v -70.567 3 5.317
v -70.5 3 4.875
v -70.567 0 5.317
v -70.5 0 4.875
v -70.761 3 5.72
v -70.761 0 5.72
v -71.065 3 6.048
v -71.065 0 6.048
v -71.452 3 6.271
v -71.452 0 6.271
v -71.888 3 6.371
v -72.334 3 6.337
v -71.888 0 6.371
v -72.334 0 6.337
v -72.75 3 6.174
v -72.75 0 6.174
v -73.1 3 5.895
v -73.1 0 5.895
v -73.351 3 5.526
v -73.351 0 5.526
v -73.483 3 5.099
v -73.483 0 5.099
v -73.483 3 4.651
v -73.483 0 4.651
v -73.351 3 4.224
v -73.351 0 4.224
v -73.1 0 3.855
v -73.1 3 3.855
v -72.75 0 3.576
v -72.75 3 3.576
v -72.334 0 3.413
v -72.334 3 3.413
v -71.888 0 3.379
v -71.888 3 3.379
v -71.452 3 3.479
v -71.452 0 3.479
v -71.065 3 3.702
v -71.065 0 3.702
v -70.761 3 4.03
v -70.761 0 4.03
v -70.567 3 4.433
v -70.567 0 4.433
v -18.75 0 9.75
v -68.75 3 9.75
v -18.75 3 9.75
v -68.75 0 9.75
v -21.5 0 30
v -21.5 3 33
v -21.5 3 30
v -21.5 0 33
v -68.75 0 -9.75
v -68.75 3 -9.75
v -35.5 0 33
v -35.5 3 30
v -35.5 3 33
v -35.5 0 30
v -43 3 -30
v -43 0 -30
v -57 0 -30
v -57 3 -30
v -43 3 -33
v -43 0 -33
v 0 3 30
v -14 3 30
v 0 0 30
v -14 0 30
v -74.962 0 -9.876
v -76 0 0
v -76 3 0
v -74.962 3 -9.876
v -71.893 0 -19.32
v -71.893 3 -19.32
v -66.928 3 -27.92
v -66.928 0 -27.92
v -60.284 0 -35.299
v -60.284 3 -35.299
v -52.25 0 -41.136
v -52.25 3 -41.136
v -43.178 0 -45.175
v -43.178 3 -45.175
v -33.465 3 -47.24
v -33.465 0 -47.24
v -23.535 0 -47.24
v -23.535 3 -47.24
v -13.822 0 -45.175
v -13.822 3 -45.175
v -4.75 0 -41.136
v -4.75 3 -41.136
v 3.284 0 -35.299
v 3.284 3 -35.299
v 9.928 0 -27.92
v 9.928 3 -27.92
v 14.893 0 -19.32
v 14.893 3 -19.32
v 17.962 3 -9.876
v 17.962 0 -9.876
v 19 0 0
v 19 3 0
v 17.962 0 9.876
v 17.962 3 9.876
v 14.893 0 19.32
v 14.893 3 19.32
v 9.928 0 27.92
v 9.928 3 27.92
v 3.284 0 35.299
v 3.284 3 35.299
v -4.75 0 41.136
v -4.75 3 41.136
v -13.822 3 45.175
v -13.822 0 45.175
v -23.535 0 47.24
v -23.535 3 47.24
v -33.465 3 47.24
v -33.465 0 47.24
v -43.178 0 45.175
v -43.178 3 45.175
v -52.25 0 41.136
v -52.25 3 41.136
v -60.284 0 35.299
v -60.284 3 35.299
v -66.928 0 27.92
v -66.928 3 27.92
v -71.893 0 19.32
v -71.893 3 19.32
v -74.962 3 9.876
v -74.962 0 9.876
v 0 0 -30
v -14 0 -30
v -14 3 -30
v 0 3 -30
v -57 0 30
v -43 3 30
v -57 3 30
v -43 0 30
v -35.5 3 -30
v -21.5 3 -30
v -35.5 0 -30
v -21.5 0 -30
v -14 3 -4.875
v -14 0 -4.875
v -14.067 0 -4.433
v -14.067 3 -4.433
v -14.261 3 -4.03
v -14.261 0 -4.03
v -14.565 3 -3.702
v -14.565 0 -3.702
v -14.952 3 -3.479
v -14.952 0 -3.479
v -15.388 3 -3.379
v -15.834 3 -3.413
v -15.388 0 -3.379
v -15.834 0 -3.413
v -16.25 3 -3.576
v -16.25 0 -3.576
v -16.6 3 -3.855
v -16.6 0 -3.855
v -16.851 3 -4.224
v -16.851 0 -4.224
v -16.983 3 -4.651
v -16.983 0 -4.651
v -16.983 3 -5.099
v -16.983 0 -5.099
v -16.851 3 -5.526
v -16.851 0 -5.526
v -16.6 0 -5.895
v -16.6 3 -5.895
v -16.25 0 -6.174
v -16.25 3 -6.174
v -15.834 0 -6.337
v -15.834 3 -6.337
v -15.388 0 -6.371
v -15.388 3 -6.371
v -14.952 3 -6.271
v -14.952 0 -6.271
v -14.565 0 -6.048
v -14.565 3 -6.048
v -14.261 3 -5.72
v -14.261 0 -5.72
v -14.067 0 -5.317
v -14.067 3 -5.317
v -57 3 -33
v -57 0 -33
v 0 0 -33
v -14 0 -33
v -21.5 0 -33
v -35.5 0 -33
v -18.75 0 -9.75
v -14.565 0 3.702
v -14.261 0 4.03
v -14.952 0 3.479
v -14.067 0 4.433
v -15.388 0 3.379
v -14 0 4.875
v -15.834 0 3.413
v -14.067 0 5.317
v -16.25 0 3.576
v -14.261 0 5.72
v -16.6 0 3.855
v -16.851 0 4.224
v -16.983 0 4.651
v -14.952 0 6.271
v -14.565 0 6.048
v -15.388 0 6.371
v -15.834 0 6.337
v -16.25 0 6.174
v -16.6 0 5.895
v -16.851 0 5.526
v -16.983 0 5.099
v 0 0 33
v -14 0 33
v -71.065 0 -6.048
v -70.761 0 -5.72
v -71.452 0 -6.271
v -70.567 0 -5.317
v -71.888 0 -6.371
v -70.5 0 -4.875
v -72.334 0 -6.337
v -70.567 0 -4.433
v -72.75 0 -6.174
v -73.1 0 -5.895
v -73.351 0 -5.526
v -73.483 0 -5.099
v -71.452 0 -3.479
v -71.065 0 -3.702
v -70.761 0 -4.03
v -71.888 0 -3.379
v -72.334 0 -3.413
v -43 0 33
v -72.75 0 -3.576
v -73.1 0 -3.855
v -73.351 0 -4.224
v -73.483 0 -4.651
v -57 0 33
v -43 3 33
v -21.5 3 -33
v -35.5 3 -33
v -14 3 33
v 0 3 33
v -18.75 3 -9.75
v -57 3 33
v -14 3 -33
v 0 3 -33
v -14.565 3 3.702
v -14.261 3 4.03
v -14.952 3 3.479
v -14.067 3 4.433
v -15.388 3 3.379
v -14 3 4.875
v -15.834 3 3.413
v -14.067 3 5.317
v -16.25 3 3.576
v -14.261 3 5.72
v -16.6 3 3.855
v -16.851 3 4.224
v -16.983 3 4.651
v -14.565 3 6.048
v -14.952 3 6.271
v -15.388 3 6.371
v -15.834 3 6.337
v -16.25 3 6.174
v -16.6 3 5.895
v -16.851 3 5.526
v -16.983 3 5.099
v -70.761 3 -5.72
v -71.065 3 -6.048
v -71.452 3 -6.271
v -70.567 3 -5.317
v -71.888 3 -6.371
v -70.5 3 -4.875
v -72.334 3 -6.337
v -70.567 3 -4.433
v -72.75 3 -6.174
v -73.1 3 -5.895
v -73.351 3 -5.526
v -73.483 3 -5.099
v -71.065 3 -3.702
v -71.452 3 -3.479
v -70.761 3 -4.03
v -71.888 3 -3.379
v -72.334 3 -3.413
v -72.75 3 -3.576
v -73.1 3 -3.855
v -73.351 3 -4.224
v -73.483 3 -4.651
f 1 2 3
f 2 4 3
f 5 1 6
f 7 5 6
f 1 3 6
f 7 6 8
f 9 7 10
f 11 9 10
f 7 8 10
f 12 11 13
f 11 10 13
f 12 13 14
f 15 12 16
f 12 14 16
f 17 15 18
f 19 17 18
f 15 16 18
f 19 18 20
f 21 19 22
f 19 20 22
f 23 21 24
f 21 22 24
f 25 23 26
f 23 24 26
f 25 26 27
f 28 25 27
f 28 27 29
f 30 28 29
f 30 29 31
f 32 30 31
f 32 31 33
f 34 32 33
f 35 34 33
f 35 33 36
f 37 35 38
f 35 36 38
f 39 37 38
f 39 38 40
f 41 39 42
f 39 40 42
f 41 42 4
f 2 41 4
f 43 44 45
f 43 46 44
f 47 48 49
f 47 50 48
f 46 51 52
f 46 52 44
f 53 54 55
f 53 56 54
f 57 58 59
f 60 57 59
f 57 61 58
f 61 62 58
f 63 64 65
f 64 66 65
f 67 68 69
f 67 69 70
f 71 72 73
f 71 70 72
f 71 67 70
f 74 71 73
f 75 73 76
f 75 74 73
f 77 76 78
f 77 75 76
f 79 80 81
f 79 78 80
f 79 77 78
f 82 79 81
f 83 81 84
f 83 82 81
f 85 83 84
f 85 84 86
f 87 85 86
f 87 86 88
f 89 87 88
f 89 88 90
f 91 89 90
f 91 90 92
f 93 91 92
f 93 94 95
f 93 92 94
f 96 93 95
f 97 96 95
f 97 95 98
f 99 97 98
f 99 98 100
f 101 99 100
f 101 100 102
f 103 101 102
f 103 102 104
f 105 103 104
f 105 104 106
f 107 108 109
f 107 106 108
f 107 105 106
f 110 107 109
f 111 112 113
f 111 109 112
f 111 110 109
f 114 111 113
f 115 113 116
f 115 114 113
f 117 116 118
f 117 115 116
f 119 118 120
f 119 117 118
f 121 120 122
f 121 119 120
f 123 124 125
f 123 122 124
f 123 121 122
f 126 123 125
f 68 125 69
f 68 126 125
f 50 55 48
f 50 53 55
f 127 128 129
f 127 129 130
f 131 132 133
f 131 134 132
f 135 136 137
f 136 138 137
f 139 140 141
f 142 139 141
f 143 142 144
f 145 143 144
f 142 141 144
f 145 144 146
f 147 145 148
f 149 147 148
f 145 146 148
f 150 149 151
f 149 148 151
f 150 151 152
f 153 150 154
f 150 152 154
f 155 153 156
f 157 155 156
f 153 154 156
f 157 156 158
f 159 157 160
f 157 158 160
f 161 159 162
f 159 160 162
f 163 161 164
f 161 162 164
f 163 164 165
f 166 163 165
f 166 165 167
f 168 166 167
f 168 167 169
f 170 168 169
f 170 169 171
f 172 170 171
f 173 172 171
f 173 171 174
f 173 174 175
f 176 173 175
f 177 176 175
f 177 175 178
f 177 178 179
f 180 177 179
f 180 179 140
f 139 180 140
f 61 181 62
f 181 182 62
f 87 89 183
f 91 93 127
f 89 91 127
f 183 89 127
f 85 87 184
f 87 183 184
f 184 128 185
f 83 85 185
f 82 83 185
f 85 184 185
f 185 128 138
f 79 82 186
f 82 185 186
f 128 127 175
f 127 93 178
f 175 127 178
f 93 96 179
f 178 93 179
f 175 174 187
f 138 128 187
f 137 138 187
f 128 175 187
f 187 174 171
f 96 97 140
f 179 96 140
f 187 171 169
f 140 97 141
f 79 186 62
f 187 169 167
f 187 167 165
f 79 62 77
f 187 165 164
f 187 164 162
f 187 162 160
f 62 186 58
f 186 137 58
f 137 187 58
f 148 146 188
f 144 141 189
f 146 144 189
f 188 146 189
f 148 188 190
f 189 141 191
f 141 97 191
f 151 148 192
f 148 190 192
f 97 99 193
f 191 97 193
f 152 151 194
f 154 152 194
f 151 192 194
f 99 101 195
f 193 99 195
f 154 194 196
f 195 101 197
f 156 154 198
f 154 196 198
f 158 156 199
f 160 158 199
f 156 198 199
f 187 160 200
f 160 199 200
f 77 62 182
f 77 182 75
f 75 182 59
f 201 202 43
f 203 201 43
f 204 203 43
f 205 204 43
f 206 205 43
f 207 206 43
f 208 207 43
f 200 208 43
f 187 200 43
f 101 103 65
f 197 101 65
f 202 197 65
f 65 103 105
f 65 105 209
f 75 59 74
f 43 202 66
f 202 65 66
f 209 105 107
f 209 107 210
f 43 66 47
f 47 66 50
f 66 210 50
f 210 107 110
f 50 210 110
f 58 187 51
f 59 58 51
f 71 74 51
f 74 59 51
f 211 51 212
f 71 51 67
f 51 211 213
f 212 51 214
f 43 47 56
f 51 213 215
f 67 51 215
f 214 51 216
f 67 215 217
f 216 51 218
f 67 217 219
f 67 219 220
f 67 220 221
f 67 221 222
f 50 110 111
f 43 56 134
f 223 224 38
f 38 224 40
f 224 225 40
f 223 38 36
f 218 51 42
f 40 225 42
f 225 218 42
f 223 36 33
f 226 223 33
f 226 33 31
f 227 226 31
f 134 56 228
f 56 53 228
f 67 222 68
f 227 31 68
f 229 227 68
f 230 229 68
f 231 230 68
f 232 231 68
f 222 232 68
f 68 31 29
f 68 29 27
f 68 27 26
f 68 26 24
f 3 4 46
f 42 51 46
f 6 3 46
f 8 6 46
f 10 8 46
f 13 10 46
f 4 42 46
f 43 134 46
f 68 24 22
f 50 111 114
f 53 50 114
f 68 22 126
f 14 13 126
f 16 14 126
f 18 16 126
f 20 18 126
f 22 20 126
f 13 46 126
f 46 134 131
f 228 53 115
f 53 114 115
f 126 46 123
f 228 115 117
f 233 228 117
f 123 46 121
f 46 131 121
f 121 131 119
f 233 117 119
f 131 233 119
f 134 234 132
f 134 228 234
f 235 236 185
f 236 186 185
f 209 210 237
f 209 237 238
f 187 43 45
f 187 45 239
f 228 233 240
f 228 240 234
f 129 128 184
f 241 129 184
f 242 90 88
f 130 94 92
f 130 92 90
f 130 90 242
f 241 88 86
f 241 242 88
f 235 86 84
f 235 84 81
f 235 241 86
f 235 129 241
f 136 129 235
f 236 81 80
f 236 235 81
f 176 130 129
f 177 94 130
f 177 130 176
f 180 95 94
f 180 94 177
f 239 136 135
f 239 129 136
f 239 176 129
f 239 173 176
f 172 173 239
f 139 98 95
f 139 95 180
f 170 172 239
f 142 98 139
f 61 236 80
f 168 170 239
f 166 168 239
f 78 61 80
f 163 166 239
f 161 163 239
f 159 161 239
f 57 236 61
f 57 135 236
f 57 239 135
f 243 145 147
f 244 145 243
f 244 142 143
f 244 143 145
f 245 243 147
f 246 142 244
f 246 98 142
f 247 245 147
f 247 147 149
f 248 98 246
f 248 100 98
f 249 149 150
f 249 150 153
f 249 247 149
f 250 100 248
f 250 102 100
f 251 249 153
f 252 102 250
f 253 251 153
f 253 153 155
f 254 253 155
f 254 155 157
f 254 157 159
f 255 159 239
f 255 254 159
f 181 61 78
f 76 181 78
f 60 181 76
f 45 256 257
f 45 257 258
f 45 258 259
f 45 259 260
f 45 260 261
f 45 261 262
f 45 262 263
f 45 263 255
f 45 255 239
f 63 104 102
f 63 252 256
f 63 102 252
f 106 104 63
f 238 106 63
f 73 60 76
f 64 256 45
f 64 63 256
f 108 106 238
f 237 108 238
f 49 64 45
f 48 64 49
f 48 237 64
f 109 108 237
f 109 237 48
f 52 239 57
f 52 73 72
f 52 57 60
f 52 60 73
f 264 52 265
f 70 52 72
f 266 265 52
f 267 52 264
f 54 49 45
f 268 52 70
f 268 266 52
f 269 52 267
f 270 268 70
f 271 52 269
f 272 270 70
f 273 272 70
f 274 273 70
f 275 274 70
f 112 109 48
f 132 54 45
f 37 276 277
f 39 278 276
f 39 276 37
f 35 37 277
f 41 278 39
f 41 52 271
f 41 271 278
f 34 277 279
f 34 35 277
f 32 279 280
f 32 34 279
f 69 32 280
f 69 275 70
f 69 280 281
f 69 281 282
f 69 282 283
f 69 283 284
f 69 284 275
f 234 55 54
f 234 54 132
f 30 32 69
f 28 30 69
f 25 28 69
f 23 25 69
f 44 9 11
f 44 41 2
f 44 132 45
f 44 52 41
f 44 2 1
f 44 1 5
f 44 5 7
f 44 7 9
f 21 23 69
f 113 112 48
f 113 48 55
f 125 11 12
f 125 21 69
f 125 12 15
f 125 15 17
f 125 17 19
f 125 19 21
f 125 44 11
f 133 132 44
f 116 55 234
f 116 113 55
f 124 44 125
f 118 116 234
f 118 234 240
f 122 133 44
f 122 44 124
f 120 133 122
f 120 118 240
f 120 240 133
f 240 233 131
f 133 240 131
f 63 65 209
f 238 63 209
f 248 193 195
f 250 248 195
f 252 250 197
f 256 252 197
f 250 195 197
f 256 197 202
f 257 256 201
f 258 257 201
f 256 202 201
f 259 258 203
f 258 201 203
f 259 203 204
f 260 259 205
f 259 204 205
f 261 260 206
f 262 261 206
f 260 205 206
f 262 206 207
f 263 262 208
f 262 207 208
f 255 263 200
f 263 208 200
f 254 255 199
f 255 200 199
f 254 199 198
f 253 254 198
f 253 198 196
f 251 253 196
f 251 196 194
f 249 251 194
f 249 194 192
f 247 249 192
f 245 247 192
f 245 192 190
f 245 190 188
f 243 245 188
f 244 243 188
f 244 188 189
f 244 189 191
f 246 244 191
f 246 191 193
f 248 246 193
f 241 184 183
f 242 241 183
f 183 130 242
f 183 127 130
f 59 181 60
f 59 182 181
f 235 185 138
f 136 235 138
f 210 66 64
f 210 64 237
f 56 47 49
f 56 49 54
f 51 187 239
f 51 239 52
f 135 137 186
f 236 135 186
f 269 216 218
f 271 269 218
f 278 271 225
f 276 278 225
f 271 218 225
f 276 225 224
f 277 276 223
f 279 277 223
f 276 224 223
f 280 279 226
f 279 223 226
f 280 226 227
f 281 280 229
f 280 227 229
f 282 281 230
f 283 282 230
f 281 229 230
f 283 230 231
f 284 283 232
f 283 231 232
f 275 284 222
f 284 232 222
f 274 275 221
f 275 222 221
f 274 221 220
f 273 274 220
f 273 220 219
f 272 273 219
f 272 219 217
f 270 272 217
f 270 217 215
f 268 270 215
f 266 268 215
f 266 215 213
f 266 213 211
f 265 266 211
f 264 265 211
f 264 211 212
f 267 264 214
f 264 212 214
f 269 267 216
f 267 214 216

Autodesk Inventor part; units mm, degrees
ref_plane "YZ Plane" through (0, 0, 0) normal (1, 0, 0) x (0, 1, 0)
ref_plane "XZ Plane" through (0, 0, 0) normal (0, 1, 0) x (-1, 0, 0)
ref_plane "XY Plane" through (0, 0, 0) normal (0, 0, 1) x (1, 0, 0)
sketch "Boceto1" plane through (0, 0, 0) normal (0, 1, 0) x (-1, 0, 0)
  circle A0 centre (28.5, 0) radius 1.5
  circle A1 centre (28.5, -8) radius 1.5
  circle A2 centre (28.5, 8) radius 1.5
  circle A3 centre (36.5, 0) radius 1.5
  circle A4 centre (20.5, 0) radius 1.5
  circle A5 centre (28.5, 0) radius 47.5
  line L0 (57, 33) -> (43, 33)
  line L1 (43, 33) -> (43, 30)
  line L2 (35.5, 30) -> (35.5, 33)
  line L3 (35.5, 33) -> (21.5, 33)
  line L4 (21.5, 33) -> (21.5, 30)
  line L5 (14, 30) -> (14, 33)
  line L6 (14, 33) -> (0, 33)
  line L7 (43, 30) -> (57, 30)
  line L8 (21.5, 30) -> (35.5, 30)
  line L9 (14, 30) -> (0, 30)
  line L10 (0, 30) -> (0, 33)
  line L11 (57, 33) -> (57, 30)
  line L12 (35.5, -30) -> (35.5, -33)
  line L13 (21.5, -30) -> (35.5, -30)
  line L14 (35.5, -33) -> (21.5, -33)
  line L15 (21.5, -33) -> (21.5, -30)
  line L16 (57, -33) -> (43, -33)
  line L17 (43, -33) -> (43, -30)
  line L18 (43, -30) -> (57, -30)
  line L19 (14, -30) -> (14, -33)
  line L20 (14, -30) -> (0, -30)
  line L21 (14, -33) -> (0, -33)
  line L22 (0, -30) -> (0, -33)
  line L23 (57, -33) -> (57, -30)
extrude "Extrusión1" add sketch "Boceto1" along normal blind 3
sketch "Boceto2" plane through (-28.5, 0, 0) normal (0, -1, 0) x (1, 0, 0)
  circle A0 centre (0, 0) radius 3.5
  point P0 (28.5, 0)
  dimension "d23" = 7
extrude "Extrusión2" cut sketch "Boceto2" against normal blind 10
sketch "Boceto3" plane through (-28.5, 0, 0) normal (0, -1, 0) x (1, 0, 0)
  circle A0 centre (0, 0) radius 4.5
  point P0 (28.5, 0)
  dimension "d26" = 9
extrude "Extrusión3" cut sketch "Boceto3" against normal blind 10
sketch "Boceto4" plane through (-28.5, 0, 0) normal (0, -1, 0) x (1, 0, 0)
  line L0 (-40.25, 9.75) -> (9.75, 9.75)
  line L1 (9.75, 9.75) -> (9.75, -9.75)
  line L2 (9.75, -9.75) -> (-40.25, -9.75)
  line L3 (-40.25, -9.75) -> (-40.25, 9.75)
  circle A0 centre (-43.5, 4.875) radius 1.5
  circle A1 centre (-43.5, -4.875) radius 1.5
  circle A2 centre (13, 4.875) radius 1.5
  circle A3 centre (13, -4.875) radius 1.5
  point P0 (28.5, 0)
  point P1 (-28.5, 33)
  point P2 (28.5, 33)
  point P3 (28.5, 30)
  point P4 (-28.5, -33)
  point P5 (0, 0)
  dimension "d32" = 50
extrude "Extrusión4" cut sketch "Boceto4" against normal blind 3
sketch "Boceto5" plane through (-28.5, 0, 0) normal (0, -1, 0) x (1, 0, 0)
  point P0 (28.5, 0)
  point P1 (-14.5, 33)
  point P2 (-28.5, 33)
  point P3 (7, 33)
  point P4 (-7, 33)
properties part number "base2"
